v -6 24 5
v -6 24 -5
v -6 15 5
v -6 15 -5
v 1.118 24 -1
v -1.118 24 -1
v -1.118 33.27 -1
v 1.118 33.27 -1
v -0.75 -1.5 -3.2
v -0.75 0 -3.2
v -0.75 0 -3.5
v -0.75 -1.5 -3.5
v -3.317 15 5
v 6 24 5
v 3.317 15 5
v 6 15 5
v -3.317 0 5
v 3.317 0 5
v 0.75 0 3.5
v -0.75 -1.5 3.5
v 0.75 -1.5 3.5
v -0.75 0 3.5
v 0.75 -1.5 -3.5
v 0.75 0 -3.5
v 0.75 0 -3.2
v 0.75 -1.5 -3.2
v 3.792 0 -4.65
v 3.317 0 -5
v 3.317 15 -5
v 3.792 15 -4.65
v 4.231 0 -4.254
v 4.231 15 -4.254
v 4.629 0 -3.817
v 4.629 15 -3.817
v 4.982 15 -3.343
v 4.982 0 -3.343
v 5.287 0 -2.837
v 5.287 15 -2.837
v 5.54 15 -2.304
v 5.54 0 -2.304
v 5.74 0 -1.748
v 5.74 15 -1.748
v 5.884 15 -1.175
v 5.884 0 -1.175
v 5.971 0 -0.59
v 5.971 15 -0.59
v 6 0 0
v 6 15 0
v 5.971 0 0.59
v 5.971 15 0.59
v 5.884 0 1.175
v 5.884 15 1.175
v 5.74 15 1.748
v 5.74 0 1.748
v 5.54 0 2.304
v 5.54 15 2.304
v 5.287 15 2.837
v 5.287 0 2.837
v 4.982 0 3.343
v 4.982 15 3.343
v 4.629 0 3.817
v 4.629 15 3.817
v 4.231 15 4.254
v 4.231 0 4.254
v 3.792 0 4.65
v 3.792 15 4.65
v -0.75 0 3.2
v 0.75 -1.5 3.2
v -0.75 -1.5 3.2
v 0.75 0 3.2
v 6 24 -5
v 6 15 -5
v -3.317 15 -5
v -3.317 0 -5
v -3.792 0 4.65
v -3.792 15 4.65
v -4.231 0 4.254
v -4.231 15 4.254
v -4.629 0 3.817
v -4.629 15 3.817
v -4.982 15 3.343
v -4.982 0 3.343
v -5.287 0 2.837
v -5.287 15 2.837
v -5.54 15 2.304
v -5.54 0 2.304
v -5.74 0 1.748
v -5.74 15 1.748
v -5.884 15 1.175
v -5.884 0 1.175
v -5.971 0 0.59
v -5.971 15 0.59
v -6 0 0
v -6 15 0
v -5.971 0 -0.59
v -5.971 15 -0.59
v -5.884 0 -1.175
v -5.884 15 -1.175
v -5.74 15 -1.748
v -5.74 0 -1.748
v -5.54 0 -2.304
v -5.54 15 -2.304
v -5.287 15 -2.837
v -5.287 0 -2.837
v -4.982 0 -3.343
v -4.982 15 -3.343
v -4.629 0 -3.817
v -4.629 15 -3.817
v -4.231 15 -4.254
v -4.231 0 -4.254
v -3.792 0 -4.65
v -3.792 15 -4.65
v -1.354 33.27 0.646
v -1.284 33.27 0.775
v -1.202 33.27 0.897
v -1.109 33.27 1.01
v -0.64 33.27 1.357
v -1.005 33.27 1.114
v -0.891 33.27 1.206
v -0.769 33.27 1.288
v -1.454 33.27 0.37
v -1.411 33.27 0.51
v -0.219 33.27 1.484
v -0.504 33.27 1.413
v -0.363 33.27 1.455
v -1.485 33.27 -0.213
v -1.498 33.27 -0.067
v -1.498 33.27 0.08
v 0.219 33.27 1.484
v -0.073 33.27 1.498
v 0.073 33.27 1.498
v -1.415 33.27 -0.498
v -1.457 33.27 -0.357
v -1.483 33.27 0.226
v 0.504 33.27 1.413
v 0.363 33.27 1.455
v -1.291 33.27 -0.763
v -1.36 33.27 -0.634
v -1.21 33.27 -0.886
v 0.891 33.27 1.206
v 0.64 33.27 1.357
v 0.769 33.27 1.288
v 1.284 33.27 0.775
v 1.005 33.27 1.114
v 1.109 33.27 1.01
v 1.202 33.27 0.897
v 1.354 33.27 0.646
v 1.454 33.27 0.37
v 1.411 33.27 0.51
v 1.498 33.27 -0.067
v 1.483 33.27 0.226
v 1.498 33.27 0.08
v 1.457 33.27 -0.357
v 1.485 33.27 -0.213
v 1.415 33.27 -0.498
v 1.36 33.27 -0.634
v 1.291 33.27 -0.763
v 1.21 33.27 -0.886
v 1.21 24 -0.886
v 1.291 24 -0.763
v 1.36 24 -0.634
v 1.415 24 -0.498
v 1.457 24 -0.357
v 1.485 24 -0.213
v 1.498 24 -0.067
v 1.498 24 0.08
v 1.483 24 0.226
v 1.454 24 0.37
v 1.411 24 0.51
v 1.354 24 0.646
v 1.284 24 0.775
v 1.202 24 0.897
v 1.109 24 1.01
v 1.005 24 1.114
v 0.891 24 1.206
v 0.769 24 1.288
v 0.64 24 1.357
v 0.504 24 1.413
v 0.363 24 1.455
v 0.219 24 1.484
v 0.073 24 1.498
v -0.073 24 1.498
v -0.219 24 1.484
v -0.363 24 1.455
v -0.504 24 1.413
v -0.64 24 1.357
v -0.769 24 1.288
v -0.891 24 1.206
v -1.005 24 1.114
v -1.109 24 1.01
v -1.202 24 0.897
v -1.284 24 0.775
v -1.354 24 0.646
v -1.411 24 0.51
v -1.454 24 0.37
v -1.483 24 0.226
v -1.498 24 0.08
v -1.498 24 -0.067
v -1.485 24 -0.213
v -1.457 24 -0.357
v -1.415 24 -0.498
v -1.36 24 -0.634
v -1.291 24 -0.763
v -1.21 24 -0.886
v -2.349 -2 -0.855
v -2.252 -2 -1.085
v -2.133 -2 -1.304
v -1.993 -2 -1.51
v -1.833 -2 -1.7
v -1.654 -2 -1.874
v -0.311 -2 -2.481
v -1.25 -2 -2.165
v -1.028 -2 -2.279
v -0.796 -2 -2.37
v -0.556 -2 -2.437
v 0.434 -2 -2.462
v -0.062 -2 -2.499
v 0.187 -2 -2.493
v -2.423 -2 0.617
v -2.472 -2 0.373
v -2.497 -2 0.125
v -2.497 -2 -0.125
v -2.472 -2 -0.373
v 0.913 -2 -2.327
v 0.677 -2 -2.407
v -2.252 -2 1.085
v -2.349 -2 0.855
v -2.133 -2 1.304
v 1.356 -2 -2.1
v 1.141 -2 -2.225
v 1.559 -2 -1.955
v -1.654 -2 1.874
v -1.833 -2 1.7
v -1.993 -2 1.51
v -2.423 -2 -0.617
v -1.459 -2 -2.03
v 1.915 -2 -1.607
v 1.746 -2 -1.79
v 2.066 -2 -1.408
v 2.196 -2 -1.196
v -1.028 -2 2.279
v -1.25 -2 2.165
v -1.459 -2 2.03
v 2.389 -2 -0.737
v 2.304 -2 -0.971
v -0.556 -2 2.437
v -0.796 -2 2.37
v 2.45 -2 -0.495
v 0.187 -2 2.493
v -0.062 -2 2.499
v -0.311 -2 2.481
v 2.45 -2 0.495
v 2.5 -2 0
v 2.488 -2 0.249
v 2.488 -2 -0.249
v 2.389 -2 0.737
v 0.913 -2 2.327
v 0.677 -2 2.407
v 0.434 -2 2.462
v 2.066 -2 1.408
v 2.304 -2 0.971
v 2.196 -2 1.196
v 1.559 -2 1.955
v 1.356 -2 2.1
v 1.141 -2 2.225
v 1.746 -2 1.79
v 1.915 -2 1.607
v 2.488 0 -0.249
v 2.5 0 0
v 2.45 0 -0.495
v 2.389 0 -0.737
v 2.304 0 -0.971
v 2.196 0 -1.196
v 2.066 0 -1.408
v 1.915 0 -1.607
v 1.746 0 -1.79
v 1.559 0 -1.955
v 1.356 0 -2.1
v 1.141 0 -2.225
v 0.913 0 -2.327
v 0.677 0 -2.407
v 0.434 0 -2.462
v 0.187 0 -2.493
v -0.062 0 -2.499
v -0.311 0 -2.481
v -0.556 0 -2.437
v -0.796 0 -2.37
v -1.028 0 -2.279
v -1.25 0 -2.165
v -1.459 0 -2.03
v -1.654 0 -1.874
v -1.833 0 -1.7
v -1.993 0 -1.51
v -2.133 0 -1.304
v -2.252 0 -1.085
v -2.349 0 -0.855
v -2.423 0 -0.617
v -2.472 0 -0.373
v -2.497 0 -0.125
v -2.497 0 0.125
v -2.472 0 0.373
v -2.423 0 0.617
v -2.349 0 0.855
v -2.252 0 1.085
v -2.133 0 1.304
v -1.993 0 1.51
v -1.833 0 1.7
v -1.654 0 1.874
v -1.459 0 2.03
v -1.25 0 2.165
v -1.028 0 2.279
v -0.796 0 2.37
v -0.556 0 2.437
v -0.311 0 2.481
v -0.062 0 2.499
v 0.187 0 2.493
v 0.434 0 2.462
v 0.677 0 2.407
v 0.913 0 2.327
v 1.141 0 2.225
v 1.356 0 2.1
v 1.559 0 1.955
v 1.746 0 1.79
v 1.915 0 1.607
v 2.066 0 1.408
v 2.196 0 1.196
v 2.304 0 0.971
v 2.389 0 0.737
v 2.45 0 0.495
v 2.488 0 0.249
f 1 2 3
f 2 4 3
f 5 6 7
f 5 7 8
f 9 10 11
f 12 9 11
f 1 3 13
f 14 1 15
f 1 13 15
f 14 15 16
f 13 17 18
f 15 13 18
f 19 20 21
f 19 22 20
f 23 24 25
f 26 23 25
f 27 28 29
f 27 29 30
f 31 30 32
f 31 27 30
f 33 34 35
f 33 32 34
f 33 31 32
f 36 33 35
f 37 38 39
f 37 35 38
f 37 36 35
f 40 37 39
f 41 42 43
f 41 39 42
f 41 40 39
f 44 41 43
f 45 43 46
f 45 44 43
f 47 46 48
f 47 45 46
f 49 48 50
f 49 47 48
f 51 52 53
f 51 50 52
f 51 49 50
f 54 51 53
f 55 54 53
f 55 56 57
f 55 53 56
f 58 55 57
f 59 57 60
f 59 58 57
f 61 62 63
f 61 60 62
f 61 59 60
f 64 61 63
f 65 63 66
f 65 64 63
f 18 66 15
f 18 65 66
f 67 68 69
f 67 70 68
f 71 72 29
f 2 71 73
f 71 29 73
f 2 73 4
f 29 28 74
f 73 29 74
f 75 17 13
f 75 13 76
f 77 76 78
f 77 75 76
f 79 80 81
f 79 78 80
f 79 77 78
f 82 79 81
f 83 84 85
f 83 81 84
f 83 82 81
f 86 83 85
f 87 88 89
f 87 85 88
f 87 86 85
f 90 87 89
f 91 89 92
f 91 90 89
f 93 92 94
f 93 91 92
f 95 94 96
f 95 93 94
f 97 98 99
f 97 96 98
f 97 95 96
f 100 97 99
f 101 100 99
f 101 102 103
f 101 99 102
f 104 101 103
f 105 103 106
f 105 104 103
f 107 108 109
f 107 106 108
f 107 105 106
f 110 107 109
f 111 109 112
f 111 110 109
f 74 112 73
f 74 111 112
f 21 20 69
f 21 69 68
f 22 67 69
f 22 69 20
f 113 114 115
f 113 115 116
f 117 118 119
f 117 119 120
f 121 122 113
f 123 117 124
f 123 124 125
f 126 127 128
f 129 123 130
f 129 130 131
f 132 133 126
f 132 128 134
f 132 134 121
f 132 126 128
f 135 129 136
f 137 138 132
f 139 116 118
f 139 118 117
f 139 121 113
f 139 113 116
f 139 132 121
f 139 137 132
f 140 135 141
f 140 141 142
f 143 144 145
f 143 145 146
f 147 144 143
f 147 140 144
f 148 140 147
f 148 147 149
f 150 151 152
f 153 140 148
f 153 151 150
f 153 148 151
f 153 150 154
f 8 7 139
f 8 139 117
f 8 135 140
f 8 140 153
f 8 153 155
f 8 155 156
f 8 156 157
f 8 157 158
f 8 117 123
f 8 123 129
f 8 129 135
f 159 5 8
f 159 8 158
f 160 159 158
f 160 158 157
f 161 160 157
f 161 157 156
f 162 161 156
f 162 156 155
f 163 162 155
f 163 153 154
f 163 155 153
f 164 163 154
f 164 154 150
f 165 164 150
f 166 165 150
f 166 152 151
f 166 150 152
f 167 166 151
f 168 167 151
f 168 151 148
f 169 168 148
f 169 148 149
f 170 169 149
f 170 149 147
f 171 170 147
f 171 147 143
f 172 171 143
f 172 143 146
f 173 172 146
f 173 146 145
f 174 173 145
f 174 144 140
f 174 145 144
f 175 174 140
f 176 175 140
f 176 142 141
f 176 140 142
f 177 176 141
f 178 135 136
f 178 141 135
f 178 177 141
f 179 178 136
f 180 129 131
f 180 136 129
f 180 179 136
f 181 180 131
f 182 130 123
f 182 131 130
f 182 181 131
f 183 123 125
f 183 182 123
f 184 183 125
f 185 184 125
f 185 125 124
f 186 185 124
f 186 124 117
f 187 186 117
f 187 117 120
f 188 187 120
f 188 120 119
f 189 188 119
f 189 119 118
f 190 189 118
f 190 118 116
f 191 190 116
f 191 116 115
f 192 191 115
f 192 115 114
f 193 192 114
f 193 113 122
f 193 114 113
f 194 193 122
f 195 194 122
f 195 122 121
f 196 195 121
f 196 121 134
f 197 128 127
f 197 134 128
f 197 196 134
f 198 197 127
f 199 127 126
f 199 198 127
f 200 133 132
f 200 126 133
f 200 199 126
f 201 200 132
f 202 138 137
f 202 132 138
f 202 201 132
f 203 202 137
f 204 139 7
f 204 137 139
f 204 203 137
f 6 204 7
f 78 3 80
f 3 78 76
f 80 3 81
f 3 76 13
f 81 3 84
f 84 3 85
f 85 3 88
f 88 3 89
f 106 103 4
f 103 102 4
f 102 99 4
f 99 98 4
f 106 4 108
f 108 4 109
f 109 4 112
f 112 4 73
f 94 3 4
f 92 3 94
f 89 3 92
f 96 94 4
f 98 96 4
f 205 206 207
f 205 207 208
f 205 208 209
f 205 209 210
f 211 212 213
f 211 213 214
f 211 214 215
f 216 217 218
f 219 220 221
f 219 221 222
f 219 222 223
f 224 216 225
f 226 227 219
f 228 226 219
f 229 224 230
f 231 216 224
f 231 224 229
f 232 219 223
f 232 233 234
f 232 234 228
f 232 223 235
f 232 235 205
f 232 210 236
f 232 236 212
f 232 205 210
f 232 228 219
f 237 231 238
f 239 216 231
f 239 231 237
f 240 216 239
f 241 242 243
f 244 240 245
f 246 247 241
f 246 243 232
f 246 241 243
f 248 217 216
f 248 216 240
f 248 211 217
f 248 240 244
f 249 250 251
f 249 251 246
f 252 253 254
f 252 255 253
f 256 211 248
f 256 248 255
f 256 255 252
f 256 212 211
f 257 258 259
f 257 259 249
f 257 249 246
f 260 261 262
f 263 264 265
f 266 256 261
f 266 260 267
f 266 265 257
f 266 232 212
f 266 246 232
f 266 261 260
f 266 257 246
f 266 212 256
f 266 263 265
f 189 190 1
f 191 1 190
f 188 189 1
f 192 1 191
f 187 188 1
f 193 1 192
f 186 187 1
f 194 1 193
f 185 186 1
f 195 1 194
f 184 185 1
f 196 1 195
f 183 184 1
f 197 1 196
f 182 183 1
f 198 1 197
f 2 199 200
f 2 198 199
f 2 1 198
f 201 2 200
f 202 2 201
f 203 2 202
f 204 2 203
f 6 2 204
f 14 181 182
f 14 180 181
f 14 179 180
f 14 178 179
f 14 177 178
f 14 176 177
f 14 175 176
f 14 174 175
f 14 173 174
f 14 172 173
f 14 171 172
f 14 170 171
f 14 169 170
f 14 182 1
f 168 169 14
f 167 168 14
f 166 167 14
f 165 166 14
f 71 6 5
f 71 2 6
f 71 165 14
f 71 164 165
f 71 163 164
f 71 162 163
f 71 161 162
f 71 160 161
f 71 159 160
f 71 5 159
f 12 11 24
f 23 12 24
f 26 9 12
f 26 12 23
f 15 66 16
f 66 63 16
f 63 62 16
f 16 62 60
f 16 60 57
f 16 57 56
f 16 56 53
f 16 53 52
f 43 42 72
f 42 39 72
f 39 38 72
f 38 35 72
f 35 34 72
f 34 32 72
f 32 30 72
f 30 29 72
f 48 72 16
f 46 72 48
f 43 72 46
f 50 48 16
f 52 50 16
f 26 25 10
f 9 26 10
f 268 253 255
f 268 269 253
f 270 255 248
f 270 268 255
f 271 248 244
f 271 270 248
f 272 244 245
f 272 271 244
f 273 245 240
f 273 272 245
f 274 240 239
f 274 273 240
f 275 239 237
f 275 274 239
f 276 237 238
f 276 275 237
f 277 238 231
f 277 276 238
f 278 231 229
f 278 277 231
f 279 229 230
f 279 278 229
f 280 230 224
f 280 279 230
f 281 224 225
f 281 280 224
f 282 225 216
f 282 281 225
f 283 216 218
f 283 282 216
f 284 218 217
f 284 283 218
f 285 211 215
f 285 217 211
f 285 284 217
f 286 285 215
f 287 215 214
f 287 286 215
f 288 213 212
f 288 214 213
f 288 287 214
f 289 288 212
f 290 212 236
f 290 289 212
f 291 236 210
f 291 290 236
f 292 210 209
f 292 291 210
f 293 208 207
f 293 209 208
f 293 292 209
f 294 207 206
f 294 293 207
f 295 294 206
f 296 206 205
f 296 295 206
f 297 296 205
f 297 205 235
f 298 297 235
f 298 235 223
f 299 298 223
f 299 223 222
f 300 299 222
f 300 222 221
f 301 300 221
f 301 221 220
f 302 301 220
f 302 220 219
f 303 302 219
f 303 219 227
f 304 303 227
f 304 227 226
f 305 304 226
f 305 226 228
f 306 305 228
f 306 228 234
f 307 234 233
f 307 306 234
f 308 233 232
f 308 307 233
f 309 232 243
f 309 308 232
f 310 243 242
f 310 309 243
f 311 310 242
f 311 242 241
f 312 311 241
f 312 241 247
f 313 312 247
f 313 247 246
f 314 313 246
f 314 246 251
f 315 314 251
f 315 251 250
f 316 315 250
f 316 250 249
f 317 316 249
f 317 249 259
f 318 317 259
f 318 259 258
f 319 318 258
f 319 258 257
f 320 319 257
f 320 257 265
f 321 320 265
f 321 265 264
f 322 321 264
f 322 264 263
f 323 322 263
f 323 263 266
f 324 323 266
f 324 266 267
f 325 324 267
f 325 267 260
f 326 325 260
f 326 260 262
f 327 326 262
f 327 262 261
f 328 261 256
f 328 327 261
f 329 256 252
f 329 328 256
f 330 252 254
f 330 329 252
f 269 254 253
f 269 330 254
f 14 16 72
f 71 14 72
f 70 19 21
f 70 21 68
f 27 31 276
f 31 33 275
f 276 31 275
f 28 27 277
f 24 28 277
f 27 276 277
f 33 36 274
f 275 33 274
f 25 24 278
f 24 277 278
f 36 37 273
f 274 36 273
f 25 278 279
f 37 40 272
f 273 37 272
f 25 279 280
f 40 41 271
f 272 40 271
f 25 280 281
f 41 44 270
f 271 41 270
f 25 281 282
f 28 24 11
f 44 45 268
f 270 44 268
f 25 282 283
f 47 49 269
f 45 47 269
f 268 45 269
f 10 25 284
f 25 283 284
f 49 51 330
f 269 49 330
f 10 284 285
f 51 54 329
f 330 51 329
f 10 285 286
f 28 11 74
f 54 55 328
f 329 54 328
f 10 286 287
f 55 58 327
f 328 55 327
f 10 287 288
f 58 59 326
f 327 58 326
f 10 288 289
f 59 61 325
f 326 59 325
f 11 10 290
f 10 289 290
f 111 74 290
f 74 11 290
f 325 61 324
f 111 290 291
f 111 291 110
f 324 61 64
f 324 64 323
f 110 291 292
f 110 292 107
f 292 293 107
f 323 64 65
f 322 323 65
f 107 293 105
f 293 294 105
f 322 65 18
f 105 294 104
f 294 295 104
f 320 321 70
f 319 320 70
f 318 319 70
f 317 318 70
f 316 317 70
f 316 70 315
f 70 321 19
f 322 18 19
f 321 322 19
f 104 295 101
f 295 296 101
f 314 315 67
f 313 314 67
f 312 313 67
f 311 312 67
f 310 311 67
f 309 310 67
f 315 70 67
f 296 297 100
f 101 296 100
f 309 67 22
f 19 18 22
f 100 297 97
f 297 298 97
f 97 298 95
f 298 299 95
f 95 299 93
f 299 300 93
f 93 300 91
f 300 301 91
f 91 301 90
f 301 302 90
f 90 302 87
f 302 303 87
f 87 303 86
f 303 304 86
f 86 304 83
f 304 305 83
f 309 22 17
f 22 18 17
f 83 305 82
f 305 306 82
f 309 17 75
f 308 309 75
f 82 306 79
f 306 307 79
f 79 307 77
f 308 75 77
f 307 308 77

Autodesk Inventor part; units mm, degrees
ref_plane "YZ Plane" through (0, 0, 0) normal (1, 0, 0) x (0, 1, 0)
ref_plane "XZ Plane" through (0, 0, 0) normal (0, 1, 0) x (-1, 0, 0)
ref_plane "XY Plane" through (0, 0, 0) normal (0, 0, 1) x (1, 0, 0)
sketch "Sketch1" plane through (0, 0, 0) normal (0, 1, 0) x (-1, 0, 0)
  line L0 (0, 0) -> (0, 5) construction
  line L1 (-3.3166, 5) -> (3.3166, 5)
  line L2 (-8.6998, 0) -> (12.7628, 0) construction
  line L3 (-3.3166, -5) -> (3.3166, -5)
  arc A0 (-3.3166, 5) -> (-3.3166, -5) centre (0, 0) ccw
  arc A1 (3.3166, -5) -> (3.3166, 5) centre (0, 0) ccw
  dimension "d1" = 5
extrude "Extrusion1" add sketch "Sketch1" along normal blind 15
sketch "Sketch2" plane through (0, 15, 0) normal (0, 1, 0) x (1, 0, 0)
  arc A0 (-3.3166, 5) -> (-3.3166, -5) centre (0, 0) ccw projected
  line L0 (-6, -5) -> (6, -5)
  line L1 (6, -5) -> (6, 5)
  line L2 (6, 5) -> (-6, 5)
  line L3 (-6, 5) -> (-6, -5)
  line L4 (-6, -5) -> (6, 5) construction
  line L5 (6, -5) -> (-6, 5) construction
extrude "Extrusion2" add sketch "Sketch2" along normal blind 9
sketch "Sketch3" plane through (0, 24, 0) normal (0, 1, 0) x (1, 0, 0)
  line L0 (-6, 5) -> (-6, -5) projected
  arc A0 (-1.118, 1) -> (1.118, 1) centre (0, 0) ccw
  line L1 (0, -1.5) -> (0, 1) construction
  line L2 (-1.118, 1) -> (1.118, 1)
  dimension "d6" = 3
  dimension "d7" = 2.5
extrude "Extrusion3" add sketch "Sketch3" along normal blind 9.27
sketch "Sketch5" plane through (0, 0, 0) normal (0, -1, 0) x (1, 0, 0)
  line L0 (0, 0) -> (0, 3.5) construction
  line L1 (0, 3.5) -> (0.75, 3.5)
  line L2 (0, 3.5) -> (-0.75, 3.5)
  line L3 (0.75, 3.5) -> (0.75, 3.2)
  line L4 (0.75, 3.2) -> (-0.75, 3.2)
  line L5 (-0.75, 3.2) -> (-0.75, 3.5)
  line L6 (7.0613, 0) -> (-6.7326, 0) construction
  line L7 (-0.75, -3.2) -> (-0.75, -3.5)
  line L8 (0.75, -3.2) -> (-0.75, -3.2)
  line L9 (0.75, -3.5) -> (0.75, -3.2)
  line L10 (0, 0) -> (0, -3.5) construction
  line L11 (0, -3.5) -> (0.75, -3.5)
  line L12 (0, -3.5) -> (-0.75, -3.5)
  dimension "d14" = 3.5
  dimension "d15" = 0.75
  dimension "d16" = 0.3
extrude "Extrusion4" add sketch "Sketch5" along normal blind 1.5
sketch "Sketch6" plane through (0, 0, 0) normal (0, -1, 0) x (1, 0, 0)
  arc A0 (3.3166, -5) -> (3.3166, 5) centre (0, 0) ccw projected
  circle A1 centre (0, 0) radius 2.5
  dimension "d19" = 5
extrude "Extrusion5" add sketch "Sketch6" along normal blind 2
properties part number "motor pololu"
